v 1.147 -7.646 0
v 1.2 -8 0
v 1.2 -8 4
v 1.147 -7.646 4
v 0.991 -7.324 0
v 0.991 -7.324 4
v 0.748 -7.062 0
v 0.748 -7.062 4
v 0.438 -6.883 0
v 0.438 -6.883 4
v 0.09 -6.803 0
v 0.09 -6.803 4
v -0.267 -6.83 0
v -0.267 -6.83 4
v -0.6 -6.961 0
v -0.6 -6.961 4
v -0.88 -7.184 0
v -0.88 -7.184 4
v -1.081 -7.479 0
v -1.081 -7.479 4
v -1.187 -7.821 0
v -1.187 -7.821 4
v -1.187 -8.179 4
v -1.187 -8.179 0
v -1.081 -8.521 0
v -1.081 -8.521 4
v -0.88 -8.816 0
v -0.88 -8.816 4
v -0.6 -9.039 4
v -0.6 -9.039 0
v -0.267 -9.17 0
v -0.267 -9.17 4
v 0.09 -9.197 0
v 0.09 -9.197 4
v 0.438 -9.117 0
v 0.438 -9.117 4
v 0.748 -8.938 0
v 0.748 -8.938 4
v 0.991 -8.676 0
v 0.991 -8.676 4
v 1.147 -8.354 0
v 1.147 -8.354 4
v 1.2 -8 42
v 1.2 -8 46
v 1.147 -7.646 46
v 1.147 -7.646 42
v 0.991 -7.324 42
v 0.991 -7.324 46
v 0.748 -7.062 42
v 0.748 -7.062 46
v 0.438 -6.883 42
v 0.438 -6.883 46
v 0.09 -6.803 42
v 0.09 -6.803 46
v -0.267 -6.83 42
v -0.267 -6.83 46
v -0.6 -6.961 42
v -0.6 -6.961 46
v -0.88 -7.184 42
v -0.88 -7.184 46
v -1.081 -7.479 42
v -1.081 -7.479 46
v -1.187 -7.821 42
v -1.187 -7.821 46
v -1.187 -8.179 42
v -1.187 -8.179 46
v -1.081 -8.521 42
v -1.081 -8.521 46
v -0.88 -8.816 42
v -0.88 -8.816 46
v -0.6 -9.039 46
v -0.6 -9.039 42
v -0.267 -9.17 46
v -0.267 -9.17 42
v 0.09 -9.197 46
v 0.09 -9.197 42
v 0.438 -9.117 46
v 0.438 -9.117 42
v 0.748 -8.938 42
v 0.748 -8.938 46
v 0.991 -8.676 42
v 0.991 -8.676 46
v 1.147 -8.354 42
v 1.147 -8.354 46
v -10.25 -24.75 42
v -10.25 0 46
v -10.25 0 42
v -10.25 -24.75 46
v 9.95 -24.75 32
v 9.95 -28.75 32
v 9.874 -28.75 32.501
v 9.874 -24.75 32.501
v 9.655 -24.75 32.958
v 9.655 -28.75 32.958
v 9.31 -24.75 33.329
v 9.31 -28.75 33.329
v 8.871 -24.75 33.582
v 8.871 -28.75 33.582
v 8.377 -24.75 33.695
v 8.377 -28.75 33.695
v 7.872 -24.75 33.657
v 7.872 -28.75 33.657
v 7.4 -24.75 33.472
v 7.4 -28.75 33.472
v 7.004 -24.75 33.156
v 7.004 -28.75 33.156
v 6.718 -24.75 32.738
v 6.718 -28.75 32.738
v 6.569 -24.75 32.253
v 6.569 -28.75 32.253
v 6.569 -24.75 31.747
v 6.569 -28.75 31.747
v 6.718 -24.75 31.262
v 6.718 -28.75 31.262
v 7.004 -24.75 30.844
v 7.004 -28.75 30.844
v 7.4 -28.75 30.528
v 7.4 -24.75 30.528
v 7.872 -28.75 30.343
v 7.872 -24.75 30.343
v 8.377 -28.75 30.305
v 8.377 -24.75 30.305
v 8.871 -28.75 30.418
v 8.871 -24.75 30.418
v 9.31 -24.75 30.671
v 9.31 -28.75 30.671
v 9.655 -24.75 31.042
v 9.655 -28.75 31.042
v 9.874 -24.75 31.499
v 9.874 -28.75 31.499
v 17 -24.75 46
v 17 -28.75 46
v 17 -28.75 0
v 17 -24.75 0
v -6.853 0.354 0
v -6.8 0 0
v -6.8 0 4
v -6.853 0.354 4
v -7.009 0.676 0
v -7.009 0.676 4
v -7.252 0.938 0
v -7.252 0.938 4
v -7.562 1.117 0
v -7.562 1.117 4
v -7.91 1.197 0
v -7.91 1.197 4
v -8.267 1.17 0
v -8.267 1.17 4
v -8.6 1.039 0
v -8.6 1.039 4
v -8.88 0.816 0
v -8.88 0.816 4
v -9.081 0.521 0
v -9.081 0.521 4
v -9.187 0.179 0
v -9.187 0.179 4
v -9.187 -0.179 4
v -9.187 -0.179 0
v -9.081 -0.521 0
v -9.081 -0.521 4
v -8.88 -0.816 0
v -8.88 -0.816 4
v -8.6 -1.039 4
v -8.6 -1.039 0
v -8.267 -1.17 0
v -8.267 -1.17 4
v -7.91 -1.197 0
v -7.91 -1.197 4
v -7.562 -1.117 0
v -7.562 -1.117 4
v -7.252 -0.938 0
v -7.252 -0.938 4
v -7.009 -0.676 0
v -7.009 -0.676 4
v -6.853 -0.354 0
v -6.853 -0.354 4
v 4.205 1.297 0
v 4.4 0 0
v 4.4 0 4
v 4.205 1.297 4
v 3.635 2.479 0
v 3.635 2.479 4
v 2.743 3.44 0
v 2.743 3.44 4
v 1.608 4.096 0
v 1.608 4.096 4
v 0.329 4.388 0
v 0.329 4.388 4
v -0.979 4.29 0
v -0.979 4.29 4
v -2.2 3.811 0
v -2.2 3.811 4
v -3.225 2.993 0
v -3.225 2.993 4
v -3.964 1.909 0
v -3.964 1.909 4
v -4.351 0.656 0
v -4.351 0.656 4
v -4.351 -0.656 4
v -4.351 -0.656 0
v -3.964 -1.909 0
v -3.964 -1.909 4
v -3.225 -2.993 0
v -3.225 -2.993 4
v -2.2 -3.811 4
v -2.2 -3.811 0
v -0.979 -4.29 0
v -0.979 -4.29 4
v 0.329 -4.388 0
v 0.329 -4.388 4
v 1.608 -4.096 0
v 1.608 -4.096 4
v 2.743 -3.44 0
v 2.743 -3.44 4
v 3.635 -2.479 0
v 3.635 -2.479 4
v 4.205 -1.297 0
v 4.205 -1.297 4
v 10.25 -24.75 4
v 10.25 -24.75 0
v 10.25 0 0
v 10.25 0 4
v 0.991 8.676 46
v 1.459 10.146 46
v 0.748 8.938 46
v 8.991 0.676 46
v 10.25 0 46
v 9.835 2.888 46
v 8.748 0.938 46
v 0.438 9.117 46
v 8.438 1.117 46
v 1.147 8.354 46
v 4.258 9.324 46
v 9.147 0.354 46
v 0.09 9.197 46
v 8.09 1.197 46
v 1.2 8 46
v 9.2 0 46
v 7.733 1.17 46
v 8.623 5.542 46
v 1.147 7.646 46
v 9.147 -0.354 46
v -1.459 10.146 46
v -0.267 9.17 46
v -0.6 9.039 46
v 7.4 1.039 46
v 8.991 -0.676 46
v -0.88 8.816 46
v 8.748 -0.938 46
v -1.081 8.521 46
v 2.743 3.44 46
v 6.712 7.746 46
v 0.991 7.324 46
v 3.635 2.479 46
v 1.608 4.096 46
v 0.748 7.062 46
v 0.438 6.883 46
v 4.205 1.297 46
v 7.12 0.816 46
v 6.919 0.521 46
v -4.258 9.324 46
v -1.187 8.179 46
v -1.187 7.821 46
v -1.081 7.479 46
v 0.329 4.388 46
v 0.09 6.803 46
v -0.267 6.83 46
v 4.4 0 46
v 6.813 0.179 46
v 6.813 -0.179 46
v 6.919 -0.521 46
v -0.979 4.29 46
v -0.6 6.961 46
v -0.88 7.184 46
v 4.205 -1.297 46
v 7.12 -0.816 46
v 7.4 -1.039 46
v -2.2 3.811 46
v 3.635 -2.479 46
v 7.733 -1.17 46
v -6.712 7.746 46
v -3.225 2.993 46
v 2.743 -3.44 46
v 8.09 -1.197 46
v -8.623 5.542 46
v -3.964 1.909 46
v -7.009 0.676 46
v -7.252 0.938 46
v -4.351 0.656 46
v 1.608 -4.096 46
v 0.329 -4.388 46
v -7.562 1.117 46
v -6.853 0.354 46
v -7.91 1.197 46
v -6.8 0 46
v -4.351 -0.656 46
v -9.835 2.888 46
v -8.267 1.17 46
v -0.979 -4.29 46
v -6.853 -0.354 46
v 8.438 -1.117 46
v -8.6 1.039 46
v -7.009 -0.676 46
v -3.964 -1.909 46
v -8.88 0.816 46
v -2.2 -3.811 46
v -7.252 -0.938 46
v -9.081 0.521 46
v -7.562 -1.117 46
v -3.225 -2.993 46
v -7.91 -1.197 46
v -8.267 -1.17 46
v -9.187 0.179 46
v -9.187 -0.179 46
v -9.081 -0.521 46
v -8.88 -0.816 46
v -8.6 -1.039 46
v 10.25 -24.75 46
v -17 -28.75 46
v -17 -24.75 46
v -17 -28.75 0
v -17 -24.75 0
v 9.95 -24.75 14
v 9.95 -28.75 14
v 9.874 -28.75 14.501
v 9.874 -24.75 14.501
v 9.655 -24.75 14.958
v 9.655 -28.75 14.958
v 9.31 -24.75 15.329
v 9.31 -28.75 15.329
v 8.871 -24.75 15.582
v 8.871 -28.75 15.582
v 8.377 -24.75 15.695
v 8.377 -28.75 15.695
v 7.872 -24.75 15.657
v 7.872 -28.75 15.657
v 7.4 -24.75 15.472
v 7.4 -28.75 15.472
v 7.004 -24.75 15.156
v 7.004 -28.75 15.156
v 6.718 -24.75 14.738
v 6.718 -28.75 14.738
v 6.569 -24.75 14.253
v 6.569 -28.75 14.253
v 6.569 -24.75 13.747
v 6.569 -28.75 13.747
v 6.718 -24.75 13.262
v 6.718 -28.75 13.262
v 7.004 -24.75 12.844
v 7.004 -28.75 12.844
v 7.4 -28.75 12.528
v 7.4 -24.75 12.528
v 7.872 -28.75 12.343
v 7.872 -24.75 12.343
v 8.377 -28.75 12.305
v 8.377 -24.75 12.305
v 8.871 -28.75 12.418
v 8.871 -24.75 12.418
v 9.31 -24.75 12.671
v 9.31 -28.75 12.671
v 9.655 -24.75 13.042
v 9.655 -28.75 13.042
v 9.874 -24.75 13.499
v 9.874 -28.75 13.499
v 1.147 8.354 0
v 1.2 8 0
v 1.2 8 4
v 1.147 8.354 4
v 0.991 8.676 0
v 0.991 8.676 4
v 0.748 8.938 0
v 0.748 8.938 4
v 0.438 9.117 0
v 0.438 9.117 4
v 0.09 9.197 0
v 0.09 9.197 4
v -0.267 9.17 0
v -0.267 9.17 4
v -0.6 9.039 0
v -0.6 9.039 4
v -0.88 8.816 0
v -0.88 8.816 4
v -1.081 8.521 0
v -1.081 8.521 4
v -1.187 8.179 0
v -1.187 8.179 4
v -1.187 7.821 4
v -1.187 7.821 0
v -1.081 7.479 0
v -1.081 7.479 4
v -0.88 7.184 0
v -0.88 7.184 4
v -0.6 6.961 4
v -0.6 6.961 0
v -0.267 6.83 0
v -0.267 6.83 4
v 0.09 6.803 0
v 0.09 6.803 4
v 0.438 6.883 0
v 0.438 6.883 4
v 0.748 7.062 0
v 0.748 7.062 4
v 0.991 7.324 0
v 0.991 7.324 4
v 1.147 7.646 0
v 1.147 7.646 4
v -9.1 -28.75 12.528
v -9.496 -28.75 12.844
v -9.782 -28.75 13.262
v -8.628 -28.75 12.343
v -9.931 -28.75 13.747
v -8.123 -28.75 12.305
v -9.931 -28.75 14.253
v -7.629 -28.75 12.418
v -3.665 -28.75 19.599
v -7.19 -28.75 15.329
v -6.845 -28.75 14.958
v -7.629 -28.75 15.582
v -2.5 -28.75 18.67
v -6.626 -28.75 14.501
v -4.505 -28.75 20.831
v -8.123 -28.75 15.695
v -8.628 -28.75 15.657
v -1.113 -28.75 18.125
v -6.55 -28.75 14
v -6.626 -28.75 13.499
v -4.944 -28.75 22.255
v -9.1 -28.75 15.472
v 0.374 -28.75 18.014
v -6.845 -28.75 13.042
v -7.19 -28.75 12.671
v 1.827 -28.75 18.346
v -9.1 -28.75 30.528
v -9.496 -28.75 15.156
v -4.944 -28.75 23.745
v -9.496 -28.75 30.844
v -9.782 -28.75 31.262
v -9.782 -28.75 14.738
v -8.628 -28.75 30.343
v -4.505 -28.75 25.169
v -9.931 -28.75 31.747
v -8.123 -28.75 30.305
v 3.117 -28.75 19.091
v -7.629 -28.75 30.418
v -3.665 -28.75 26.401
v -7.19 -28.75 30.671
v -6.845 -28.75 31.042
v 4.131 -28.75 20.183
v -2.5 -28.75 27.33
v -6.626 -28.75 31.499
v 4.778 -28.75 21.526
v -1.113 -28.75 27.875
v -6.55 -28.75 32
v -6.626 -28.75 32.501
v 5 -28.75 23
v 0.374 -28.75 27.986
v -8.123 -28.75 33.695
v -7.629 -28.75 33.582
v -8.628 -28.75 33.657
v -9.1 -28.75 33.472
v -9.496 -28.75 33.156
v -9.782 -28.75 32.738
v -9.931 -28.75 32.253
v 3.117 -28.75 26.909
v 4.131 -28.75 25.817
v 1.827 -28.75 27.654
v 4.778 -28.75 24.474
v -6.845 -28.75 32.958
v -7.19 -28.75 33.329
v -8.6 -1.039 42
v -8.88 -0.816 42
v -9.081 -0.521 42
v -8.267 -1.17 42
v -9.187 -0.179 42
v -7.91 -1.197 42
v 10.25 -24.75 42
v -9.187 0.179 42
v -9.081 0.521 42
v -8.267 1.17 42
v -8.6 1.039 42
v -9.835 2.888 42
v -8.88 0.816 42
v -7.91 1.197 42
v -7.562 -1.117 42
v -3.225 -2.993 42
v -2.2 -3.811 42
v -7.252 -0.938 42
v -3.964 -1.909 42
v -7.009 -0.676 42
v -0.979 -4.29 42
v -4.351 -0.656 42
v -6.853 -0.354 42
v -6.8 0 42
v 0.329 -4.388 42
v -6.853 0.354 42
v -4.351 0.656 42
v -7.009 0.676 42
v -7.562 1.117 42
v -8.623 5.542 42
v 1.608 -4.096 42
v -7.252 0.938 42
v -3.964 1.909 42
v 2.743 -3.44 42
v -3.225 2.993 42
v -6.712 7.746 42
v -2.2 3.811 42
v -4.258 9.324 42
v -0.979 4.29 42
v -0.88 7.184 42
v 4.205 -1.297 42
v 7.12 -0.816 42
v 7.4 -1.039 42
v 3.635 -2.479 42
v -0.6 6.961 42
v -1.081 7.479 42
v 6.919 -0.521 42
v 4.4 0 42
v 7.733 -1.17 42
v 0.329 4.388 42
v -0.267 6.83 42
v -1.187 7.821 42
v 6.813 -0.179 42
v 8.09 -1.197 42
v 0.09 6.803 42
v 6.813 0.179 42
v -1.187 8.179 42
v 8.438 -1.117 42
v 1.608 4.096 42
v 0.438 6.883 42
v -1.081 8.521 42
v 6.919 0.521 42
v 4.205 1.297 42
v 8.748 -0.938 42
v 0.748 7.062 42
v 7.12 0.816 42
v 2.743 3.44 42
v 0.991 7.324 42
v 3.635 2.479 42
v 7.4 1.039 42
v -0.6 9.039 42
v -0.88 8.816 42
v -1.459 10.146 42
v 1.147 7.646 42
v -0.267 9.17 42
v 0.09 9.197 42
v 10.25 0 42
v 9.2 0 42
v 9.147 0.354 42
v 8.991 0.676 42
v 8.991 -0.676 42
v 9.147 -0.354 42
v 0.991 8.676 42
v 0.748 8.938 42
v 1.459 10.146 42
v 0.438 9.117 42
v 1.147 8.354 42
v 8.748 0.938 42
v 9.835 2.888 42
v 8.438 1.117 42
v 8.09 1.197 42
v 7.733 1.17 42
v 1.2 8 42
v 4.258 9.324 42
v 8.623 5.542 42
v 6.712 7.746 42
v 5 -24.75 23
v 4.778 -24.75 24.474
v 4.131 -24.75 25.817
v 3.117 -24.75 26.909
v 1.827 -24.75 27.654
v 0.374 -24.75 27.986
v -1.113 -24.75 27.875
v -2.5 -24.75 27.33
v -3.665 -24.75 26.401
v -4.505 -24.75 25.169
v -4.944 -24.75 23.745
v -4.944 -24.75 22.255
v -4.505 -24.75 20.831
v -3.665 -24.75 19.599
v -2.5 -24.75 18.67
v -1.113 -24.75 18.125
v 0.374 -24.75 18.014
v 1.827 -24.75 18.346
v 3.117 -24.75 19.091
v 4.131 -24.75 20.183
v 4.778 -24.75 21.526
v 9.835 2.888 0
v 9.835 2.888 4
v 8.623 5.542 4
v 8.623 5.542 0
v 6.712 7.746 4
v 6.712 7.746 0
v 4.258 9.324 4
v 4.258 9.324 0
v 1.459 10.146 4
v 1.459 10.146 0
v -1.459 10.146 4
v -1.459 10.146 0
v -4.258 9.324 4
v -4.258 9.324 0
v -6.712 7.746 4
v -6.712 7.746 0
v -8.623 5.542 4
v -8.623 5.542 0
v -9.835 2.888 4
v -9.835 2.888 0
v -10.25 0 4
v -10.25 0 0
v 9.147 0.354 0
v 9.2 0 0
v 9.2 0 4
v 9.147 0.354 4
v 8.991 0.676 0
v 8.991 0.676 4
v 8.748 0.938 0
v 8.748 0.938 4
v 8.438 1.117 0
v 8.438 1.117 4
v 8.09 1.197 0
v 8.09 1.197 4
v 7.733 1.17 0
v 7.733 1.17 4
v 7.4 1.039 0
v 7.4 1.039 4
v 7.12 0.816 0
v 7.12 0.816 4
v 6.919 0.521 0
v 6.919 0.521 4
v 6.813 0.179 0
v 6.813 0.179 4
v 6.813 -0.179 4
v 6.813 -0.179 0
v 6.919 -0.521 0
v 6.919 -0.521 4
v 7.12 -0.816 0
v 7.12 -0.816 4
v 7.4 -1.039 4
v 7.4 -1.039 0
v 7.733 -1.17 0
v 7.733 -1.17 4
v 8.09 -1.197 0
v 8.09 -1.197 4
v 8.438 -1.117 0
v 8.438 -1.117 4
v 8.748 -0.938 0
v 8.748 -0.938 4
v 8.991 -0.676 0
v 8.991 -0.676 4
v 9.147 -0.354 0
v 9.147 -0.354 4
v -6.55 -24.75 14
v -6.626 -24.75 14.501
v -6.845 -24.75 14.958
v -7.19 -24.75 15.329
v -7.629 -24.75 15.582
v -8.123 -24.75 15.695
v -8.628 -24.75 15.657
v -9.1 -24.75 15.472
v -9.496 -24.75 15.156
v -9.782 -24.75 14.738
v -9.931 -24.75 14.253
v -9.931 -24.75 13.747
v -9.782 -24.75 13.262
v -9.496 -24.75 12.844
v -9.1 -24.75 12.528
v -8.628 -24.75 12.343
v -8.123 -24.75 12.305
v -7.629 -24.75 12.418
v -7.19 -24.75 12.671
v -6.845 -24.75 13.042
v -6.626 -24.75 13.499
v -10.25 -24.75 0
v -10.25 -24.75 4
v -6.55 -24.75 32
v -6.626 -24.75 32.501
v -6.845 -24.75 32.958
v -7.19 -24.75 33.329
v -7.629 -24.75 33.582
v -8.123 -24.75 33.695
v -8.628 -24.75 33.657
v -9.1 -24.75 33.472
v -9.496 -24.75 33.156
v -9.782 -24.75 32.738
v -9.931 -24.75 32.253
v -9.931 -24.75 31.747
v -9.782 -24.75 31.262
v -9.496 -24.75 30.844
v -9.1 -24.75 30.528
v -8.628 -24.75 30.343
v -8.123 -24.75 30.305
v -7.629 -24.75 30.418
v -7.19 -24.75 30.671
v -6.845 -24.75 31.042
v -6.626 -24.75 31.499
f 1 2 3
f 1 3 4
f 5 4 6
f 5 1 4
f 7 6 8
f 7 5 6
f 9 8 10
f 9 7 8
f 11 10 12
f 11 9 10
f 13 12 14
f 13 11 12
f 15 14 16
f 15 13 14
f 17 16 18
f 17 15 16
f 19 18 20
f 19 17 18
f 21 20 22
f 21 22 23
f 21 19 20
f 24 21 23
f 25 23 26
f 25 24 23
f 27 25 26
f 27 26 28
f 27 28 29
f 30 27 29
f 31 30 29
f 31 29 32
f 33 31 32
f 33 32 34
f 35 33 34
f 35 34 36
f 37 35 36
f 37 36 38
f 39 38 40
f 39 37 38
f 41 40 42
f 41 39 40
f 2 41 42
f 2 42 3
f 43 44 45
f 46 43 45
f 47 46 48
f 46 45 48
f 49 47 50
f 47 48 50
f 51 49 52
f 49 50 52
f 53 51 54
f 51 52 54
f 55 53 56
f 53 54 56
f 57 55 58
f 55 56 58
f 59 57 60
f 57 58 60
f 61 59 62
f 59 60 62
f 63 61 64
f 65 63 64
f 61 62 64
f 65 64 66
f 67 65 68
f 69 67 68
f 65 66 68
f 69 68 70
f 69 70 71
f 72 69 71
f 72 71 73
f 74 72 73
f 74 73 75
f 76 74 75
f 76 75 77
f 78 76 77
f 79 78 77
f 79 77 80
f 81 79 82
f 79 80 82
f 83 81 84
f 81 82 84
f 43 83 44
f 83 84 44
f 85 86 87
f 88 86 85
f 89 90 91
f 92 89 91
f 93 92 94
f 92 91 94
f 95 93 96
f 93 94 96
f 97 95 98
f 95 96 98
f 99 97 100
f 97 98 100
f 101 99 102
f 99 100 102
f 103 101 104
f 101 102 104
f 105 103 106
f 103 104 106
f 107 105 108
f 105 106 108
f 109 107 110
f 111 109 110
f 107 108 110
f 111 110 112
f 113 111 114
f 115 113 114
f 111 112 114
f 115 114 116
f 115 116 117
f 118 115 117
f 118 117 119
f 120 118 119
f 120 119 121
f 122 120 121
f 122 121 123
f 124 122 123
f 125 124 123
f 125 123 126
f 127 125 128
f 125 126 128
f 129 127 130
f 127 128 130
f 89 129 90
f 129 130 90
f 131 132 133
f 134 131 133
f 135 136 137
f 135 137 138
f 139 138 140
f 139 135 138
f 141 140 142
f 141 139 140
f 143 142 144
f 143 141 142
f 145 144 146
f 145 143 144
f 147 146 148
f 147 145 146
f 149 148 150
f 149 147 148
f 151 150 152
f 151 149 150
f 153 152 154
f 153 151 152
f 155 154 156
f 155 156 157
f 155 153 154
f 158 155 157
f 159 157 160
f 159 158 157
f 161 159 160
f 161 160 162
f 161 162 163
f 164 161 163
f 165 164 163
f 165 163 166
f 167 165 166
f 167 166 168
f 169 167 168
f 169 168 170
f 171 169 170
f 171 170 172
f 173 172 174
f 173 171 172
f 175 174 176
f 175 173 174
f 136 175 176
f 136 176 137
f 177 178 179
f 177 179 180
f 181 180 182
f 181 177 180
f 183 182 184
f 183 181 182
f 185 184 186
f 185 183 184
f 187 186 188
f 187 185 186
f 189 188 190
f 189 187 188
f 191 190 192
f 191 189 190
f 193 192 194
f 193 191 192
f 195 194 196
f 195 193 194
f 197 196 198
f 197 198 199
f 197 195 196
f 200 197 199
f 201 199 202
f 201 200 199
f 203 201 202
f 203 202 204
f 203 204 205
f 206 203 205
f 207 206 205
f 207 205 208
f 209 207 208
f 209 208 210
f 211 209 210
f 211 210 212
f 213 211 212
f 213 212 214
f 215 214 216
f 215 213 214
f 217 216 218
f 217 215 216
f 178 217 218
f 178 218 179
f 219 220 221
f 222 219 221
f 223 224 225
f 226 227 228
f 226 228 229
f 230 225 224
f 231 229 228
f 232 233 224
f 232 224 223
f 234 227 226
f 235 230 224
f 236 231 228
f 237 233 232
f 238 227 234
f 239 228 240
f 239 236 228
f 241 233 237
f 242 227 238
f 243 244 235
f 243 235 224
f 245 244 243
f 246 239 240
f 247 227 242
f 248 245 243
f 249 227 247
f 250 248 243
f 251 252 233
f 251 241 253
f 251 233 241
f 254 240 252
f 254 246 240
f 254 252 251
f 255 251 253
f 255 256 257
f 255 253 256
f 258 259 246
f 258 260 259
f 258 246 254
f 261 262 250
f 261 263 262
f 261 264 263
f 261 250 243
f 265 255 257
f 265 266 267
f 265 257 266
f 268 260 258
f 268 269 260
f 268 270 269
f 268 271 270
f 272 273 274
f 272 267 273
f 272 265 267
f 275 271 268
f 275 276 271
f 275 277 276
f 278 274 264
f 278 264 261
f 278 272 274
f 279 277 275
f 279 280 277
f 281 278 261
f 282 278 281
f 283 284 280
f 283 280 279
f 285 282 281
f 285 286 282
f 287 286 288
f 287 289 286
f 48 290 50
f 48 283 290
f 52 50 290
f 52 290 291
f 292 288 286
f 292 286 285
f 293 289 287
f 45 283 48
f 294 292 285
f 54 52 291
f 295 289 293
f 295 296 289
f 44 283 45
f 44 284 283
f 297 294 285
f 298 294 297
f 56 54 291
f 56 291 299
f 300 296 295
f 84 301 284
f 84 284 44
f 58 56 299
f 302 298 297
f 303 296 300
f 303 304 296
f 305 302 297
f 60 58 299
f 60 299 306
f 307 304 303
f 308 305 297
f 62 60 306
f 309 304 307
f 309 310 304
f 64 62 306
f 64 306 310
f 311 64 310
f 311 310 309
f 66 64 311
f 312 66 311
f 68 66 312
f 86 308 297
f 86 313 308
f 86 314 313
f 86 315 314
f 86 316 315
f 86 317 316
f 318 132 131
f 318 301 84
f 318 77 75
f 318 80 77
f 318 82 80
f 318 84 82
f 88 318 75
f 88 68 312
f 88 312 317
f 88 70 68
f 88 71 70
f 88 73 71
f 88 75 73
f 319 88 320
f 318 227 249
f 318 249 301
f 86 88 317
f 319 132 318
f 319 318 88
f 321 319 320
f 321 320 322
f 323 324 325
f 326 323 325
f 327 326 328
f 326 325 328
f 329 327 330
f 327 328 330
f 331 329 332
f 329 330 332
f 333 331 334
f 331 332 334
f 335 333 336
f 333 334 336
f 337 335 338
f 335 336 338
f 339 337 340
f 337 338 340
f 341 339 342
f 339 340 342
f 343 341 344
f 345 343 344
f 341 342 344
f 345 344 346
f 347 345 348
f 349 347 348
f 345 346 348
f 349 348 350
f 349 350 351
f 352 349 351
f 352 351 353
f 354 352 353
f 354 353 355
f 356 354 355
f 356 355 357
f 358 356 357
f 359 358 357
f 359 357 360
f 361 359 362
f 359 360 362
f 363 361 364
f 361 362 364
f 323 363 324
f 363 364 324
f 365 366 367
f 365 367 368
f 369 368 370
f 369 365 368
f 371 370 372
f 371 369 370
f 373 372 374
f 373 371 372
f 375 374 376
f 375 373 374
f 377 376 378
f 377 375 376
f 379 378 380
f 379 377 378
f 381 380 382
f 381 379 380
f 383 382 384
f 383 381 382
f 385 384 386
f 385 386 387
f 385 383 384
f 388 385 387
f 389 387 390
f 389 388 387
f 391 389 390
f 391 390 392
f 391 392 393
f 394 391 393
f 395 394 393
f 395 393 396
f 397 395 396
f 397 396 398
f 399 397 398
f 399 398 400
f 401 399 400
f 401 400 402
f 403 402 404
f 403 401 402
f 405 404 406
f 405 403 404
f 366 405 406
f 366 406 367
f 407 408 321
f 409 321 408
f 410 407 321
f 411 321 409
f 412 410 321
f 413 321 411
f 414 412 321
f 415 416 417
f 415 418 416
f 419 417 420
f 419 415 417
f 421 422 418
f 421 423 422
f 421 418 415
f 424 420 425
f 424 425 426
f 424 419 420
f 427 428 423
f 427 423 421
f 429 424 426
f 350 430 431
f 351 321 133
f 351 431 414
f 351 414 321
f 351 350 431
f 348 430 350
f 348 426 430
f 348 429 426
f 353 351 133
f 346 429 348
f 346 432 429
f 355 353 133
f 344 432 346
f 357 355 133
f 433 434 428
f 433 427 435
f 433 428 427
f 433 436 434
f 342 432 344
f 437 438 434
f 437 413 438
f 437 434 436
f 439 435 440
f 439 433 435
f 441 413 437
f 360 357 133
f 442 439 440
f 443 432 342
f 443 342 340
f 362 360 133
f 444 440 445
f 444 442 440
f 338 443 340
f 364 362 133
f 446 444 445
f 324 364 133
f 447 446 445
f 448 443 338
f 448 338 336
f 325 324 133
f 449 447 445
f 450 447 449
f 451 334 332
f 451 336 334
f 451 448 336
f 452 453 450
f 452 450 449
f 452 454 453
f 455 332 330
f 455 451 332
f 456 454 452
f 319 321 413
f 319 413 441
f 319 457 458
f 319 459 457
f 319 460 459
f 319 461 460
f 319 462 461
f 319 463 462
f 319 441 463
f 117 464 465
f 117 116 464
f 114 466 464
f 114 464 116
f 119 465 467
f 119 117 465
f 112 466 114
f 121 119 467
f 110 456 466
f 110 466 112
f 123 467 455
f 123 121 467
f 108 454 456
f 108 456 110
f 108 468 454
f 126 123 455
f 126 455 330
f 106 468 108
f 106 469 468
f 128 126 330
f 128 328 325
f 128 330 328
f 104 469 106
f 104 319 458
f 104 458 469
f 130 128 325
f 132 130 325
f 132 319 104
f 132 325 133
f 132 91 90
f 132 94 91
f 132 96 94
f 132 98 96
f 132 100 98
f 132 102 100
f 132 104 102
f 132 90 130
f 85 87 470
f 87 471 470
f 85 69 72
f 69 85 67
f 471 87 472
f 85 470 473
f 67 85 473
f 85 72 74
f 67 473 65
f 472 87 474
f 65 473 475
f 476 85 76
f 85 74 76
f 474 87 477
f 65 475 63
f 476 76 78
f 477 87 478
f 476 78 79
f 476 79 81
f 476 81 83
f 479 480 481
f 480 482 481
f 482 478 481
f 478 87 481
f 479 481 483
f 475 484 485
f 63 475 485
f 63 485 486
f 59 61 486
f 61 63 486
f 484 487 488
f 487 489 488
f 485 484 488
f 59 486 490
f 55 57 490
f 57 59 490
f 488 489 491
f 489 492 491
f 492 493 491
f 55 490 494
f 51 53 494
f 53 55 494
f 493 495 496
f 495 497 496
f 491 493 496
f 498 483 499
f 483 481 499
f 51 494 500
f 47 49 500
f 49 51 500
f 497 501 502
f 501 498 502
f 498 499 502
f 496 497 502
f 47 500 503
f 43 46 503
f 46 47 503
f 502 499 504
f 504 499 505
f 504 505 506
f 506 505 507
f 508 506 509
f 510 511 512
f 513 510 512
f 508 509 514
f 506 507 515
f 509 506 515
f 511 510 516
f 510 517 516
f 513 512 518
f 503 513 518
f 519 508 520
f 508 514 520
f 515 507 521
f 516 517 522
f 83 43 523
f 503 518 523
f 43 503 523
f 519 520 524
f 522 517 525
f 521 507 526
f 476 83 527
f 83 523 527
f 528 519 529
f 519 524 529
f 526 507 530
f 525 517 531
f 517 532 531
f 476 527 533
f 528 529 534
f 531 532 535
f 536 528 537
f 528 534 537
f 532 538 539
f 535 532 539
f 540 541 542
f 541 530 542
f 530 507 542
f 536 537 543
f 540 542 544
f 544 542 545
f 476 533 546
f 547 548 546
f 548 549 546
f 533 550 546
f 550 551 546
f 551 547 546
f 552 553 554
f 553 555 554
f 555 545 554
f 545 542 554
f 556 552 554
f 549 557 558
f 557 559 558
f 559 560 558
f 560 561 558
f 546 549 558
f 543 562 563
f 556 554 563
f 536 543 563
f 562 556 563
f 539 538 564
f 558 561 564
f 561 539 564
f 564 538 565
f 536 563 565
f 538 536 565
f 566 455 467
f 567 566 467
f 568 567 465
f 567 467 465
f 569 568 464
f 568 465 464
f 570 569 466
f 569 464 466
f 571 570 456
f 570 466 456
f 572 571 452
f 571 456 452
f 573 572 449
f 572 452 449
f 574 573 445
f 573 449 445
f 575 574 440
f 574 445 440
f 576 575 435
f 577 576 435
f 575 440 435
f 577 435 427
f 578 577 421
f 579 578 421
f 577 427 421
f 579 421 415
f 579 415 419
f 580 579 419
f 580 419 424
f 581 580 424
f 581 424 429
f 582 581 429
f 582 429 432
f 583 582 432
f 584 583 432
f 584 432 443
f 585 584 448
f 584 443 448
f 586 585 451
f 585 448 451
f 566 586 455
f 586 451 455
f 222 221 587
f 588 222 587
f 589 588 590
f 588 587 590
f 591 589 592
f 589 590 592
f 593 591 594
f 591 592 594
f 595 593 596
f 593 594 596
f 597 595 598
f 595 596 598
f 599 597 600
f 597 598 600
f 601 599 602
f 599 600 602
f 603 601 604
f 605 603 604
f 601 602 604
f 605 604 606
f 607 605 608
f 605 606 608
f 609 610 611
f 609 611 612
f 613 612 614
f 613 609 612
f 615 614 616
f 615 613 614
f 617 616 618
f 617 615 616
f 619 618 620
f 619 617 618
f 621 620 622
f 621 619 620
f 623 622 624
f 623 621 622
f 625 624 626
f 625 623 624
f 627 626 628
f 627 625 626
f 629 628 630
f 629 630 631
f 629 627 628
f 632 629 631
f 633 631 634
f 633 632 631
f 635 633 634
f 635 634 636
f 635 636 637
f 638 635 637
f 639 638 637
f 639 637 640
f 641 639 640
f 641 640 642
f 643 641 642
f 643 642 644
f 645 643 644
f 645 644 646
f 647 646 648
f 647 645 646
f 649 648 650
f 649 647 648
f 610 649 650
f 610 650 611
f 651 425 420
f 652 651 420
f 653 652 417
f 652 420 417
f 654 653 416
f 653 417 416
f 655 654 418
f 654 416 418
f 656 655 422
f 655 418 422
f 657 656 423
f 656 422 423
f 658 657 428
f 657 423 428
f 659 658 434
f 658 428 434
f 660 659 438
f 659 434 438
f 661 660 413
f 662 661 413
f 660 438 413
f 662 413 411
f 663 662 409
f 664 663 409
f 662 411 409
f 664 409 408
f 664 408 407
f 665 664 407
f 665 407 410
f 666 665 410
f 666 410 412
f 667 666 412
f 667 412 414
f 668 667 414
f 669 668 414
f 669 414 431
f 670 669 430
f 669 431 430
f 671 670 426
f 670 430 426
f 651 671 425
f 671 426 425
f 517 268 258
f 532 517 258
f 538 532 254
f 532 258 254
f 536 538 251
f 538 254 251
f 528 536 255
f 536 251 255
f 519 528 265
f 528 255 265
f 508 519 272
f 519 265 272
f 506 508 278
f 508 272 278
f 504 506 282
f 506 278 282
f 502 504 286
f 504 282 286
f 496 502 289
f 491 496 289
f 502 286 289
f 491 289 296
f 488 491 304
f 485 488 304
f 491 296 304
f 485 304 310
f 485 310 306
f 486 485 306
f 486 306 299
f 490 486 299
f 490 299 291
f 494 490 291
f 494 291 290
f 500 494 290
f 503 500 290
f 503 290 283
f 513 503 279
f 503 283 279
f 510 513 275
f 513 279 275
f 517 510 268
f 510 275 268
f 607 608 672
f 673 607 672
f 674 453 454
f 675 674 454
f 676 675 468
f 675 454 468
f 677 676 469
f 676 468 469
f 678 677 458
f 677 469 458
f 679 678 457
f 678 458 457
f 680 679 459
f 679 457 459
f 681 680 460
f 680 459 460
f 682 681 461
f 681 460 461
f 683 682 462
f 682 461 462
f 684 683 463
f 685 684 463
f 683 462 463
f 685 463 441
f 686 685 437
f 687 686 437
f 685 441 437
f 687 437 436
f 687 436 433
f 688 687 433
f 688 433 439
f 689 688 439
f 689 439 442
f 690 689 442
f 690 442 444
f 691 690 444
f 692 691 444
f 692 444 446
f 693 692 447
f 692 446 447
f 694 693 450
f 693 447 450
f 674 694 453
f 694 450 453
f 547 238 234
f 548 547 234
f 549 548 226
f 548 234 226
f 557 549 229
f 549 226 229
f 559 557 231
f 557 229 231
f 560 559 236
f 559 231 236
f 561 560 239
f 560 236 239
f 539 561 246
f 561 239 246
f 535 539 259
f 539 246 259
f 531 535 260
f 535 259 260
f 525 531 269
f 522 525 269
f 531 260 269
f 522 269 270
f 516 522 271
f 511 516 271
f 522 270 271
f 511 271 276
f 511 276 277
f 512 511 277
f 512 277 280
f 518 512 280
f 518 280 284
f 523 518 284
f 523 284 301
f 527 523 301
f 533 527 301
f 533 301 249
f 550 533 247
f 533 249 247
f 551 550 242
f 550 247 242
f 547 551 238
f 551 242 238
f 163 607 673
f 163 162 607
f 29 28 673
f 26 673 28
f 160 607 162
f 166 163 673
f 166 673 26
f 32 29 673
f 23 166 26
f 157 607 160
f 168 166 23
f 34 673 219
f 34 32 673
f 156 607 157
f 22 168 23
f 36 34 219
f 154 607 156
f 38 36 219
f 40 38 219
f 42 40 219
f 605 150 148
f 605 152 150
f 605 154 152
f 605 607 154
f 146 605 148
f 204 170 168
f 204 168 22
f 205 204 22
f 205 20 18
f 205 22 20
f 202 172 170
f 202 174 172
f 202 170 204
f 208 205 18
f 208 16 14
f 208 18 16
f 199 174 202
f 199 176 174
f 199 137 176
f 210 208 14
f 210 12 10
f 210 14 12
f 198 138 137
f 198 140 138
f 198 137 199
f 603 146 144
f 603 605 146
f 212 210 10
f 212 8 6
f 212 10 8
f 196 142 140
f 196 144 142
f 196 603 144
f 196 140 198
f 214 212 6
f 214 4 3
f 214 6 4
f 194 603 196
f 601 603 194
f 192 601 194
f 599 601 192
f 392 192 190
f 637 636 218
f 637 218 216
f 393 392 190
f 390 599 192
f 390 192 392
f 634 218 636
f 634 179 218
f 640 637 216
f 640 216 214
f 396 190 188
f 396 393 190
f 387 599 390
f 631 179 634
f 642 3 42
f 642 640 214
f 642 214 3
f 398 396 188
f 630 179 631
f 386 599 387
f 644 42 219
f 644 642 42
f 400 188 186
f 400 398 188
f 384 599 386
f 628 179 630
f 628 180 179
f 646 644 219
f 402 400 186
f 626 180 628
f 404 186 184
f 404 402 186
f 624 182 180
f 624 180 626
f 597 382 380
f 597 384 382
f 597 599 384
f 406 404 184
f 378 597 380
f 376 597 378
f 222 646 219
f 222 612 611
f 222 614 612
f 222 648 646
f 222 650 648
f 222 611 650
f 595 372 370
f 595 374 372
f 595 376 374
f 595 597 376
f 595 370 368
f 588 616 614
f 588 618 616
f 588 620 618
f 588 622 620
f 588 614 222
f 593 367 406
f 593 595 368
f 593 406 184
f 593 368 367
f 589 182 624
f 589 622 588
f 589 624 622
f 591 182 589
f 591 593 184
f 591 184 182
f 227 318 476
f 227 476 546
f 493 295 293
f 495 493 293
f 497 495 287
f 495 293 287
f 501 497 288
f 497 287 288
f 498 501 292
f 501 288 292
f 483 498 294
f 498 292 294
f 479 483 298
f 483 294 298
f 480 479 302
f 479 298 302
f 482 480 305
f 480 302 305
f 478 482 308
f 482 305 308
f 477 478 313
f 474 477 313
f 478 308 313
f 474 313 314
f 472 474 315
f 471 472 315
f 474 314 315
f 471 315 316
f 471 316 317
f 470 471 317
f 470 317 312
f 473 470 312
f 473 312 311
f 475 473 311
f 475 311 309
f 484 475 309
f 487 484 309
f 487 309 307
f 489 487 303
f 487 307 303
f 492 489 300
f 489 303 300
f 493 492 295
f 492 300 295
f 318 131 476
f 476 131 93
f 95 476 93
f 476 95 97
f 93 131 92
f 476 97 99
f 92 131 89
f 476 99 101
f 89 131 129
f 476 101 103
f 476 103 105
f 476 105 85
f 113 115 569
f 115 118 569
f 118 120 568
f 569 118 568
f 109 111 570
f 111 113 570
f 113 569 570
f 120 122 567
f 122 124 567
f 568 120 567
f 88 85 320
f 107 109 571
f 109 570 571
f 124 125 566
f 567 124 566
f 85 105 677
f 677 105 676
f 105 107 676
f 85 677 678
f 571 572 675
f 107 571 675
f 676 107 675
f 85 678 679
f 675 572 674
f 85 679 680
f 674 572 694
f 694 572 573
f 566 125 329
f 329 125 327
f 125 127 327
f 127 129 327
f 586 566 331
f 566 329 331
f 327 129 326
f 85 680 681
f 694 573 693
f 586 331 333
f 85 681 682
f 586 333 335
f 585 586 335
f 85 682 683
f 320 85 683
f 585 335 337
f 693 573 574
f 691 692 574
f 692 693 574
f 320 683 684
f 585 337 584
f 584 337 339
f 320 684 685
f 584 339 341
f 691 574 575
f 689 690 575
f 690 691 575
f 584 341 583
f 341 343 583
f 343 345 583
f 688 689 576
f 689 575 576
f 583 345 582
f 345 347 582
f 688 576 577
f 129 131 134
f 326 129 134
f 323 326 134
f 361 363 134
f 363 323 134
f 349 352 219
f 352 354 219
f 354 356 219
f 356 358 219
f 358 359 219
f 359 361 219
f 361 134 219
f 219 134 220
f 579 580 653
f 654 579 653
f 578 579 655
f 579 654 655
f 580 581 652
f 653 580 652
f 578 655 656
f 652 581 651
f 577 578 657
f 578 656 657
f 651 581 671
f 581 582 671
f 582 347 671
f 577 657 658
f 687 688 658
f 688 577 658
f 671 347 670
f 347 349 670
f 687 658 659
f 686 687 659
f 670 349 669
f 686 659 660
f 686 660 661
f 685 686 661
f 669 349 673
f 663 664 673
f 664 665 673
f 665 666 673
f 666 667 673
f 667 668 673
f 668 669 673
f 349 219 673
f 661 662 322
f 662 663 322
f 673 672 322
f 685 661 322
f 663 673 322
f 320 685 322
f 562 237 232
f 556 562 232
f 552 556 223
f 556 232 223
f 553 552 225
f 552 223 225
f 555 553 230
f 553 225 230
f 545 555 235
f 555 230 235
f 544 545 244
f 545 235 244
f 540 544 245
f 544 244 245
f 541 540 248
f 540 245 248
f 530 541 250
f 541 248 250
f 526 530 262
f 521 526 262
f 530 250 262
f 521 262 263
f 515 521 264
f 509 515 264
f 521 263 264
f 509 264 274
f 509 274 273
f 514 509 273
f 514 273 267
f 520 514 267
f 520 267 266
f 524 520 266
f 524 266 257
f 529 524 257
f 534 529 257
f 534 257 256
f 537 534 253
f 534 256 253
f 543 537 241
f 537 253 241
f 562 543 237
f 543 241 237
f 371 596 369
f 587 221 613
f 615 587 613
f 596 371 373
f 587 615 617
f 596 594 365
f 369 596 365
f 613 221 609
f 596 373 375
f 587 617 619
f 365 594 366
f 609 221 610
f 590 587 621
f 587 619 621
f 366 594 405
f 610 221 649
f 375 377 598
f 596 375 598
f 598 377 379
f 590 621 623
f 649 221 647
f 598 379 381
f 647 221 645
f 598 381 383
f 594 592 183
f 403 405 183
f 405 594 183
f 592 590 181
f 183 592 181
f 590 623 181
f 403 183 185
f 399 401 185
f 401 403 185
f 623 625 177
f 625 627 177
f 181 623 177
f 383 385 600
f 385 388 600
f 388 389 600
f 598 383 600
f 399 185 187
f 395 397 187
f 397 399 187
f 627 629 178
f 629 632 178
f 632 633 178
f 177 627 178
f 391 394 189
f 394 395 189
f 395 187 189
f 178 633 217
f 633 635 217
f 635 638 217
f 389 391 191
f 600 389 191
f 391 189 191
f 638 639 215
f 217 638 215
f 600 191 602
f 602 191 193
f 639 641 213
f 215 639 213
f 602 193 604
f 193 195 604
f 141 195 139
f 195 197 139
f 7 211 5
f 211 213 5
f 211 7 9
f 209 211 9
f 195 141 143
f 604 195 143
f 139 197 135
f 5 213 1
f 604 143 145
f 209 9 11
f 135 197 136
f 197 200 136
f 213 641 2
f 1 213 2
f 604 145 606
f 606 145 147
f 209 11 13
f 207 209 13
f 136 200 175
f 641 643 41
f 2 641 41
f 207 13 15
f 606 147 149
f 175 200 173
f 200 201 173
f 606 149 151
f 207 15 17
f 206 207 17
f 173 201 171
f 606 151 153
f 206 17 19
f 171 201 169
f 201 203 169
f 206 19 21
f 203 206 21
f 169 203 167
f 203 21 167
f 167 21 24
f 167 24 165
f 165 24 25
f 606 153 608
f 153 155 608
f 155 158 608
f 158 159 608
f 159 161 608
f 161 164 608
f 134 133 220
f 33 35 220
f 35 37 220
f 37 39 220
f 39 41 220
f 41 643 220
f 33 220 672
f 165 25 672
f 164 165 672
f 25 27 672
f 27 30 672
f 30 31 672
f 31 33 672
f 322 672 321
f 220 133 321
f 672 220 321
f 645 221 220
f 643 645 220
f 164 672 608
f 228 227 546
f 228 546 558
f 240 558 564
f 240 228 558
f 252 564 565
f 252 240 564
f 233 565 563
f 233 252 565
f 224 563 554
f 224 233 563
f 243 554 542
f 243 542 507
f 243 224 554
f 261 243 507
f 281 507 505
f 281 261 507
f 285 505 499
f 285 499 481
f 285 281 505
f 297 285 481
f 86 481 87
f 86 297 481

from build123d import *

# Parameters (mm, degrees)
SKETCH1_R           = 1.2
SKETCH1_R_2         = 4.4
BOSS_EXTRUDE1_DEPTH = 4
SKETCH3_W           = 34
SKETCH3_H           = 46
SKETCH3_R           = 5
SKETCH3_R_2         = 1.7
BOSS_EXTRUDE3_DEPTH = 4


with BuildPart() as part:
    # Sketch1 → Boss-Extrude1 (new body)
    with BuildSketch(Plane.XY):
        with BuildLine():
            Line((-10.25, -28.75), (10.25, -28.75))
            Line((10.25, -28.75), (10.25, 0))
            ThreePointArc((10.25, 0), (0, 10.25), (-10.25, 0))
            Line((-10.25, 0), (-10.25, -28.75))
        make_face()
        with Locations((0, 8)):
            Circle(SKETCH1_R, mode=Mode.SUBTRACT)
        with Locations((-8, 0)):
            Circle(SKETCH1_R, mode=Mode.SUBTRACT)
        with Locations((0, -8)):
            Circle(SKETCH1_R, mode=Mode.SUBTRACT)
        with Locations((8, 0)):
            Circle(SKETCH1_R, mode=Mode.SUBTRACT)
        Circle(SKETCH1_R_2, mode=Mode.SUBTRACT)
    boss_extrude1 = extrude(amount=BOSS_EXTRUDE1_DEPTH)

    # Sketch3 → Boss-Extrude3 (add)
    with BuildSketch(Plane(origin=(0, -28.75, 0), x_dir=(-1, 0, 0), z_dir=(0, -1, 0))):
        with Locations((0, -23)):
            Rectangle(SKETCH3_W, SKETCH3_H)
        with Locations(Location((0, -23, 0), (0, 0, 180))):
            Circle(SKETCH3_R, mode=Mode.SUBTRACT)
        with Locations(Location((-8.25, -14, 0), (0, 0, 180))):
            Circle(SKETCH3_R_2, mode=Mode.SUBTRACT)
        with Locations(Location((8.25, -14, 0), (0, 0, 180))):
            Circle(SKETCH3_R_2, mode=Mode.SUBTRACT)
        with Locations(Location((8.25, -32, 0), (0, 0, 180))):
            Circle(SKETCH3_R_2, mode=Mode.SUBTRACT)
        with Locations(Location((-8.25, -32, 0), (0, 0, 180))):
            Circle(SKETCH3_R_2, mode=Mode.SUBTRACT)
    extrude(amount=-BOSS_EXTRUDE3_DEPTH)

    # Mirror1: Boss-Extrude1 across plane
    add(boss_extrude1.mirror(Plane.XY.offset(23)))


solid = part.part
